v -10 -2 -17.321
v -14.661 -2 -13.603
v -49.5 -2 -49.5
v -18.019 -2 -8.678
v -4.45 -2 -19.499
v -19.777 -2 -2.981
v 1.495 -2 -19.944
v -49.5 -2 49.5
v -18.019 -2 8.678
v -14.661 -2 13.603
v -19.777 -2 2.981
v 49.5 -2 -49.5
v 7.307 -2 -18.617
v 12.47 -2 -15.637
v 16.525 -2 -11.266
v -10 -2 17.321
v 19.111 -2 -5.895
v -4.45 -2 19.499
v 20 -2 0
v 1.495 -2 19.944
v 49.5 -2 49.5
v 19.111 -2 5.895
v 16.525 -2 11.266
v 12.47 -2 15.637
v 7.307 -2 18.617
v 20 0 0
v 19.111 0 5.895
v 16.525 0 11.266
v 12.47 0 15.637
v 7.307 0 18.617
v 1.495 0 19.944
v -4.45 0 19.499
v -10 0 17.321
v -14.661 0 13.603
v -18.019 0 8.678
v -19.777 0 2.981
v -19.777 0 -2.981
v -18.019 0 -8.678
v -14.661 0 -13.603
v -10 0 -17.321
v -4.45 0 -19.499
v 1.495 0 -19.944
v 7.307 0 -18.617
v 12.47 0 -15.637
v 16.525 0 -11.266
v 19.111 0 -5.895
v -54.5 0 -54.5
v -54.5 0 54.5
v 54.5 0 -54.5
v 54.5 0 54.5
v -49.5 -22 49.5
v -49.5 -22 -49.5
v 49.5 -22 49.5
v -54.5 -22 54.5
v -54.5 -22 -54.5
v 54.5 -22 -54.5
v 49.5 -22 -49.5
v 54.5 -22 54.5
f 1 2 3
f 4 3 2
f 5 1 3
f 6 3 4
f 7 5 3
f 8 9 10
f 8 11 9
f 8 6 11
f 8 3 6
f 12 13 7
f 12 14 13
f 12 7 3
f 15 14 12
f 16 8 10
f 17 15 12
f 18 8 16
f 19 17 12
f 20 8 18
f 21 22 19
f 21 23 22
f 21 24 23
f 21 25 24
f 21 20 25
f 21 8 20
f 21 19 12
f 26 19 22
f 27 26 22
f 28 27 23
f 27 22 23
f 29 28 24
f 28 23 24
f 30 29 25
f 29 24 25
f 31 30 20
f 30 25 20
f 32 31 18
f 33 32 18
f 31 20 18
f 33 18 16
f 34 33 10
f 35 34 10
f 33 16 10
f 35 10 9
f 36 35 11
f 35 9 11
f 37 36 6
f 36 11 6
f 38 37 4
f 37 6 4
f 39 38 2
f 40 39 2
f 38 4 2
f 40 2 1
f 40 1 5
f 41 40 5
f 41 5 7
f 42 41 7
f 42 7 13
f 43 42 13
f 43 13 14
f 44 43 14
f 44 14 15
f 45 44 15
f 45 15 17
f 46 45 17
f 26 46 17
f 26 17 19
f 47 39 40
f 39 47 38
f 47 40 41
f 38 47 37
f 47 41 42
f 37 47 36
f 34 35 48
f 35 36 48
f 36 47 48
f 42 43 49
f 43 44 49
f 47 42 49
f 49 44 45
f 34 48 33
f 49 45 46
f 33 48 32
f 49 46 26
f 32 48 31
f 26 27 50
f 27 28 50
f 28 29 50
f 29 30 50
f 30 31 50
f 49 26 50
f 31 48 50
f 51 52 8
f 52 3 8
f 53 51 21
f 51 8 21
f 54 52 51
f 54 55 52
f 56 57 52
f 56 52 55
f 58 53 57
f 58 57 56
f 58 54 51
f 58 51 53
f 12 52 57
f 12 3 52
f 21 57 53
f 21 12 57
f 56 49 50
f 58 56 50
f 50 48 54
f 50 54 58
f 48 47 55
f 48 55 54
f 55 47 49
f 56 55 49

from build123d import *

# Parameters (mm, degrees)
F4_W     = 109
F4_H     = 109
F5_DEPTH = 22
F6_T     = -5
F7_DEPTH = 3
F9_D     = 40


with BuildPart() as f5:
    # F4 (on Front) → F5 (new body)
    with BuildSketch(Plane.XZ):
        Rectangle(F4_W, F4_H)
    extrude(amount=F5_DEPTH)

    # F6
    f6_openings = [f5.faces().sort_by_distance(p)[0] for p in [
        (0, -22, 0),
    ]]
    offset(amount=F6_T, openings=f6_openings)

    # F7 (cut): a face of the model
    f7_faces = [f5.faces().sort_by_distance(p)[0] for p in [
        (0, -5, 0),
    ]]
    extrude(f7_faces, amount=-F7_DEPTH, mode=Mode.SUBTRACT)

    # F9 (through all)
    with Locations(Plane(origin=(0, 0, 0), x_dir=(-1, 0, 0), z_dir=(0, 1, 0))):
        with Locations((0, 0)):
            Hole(F9_D / 2)


solid = f5.part
